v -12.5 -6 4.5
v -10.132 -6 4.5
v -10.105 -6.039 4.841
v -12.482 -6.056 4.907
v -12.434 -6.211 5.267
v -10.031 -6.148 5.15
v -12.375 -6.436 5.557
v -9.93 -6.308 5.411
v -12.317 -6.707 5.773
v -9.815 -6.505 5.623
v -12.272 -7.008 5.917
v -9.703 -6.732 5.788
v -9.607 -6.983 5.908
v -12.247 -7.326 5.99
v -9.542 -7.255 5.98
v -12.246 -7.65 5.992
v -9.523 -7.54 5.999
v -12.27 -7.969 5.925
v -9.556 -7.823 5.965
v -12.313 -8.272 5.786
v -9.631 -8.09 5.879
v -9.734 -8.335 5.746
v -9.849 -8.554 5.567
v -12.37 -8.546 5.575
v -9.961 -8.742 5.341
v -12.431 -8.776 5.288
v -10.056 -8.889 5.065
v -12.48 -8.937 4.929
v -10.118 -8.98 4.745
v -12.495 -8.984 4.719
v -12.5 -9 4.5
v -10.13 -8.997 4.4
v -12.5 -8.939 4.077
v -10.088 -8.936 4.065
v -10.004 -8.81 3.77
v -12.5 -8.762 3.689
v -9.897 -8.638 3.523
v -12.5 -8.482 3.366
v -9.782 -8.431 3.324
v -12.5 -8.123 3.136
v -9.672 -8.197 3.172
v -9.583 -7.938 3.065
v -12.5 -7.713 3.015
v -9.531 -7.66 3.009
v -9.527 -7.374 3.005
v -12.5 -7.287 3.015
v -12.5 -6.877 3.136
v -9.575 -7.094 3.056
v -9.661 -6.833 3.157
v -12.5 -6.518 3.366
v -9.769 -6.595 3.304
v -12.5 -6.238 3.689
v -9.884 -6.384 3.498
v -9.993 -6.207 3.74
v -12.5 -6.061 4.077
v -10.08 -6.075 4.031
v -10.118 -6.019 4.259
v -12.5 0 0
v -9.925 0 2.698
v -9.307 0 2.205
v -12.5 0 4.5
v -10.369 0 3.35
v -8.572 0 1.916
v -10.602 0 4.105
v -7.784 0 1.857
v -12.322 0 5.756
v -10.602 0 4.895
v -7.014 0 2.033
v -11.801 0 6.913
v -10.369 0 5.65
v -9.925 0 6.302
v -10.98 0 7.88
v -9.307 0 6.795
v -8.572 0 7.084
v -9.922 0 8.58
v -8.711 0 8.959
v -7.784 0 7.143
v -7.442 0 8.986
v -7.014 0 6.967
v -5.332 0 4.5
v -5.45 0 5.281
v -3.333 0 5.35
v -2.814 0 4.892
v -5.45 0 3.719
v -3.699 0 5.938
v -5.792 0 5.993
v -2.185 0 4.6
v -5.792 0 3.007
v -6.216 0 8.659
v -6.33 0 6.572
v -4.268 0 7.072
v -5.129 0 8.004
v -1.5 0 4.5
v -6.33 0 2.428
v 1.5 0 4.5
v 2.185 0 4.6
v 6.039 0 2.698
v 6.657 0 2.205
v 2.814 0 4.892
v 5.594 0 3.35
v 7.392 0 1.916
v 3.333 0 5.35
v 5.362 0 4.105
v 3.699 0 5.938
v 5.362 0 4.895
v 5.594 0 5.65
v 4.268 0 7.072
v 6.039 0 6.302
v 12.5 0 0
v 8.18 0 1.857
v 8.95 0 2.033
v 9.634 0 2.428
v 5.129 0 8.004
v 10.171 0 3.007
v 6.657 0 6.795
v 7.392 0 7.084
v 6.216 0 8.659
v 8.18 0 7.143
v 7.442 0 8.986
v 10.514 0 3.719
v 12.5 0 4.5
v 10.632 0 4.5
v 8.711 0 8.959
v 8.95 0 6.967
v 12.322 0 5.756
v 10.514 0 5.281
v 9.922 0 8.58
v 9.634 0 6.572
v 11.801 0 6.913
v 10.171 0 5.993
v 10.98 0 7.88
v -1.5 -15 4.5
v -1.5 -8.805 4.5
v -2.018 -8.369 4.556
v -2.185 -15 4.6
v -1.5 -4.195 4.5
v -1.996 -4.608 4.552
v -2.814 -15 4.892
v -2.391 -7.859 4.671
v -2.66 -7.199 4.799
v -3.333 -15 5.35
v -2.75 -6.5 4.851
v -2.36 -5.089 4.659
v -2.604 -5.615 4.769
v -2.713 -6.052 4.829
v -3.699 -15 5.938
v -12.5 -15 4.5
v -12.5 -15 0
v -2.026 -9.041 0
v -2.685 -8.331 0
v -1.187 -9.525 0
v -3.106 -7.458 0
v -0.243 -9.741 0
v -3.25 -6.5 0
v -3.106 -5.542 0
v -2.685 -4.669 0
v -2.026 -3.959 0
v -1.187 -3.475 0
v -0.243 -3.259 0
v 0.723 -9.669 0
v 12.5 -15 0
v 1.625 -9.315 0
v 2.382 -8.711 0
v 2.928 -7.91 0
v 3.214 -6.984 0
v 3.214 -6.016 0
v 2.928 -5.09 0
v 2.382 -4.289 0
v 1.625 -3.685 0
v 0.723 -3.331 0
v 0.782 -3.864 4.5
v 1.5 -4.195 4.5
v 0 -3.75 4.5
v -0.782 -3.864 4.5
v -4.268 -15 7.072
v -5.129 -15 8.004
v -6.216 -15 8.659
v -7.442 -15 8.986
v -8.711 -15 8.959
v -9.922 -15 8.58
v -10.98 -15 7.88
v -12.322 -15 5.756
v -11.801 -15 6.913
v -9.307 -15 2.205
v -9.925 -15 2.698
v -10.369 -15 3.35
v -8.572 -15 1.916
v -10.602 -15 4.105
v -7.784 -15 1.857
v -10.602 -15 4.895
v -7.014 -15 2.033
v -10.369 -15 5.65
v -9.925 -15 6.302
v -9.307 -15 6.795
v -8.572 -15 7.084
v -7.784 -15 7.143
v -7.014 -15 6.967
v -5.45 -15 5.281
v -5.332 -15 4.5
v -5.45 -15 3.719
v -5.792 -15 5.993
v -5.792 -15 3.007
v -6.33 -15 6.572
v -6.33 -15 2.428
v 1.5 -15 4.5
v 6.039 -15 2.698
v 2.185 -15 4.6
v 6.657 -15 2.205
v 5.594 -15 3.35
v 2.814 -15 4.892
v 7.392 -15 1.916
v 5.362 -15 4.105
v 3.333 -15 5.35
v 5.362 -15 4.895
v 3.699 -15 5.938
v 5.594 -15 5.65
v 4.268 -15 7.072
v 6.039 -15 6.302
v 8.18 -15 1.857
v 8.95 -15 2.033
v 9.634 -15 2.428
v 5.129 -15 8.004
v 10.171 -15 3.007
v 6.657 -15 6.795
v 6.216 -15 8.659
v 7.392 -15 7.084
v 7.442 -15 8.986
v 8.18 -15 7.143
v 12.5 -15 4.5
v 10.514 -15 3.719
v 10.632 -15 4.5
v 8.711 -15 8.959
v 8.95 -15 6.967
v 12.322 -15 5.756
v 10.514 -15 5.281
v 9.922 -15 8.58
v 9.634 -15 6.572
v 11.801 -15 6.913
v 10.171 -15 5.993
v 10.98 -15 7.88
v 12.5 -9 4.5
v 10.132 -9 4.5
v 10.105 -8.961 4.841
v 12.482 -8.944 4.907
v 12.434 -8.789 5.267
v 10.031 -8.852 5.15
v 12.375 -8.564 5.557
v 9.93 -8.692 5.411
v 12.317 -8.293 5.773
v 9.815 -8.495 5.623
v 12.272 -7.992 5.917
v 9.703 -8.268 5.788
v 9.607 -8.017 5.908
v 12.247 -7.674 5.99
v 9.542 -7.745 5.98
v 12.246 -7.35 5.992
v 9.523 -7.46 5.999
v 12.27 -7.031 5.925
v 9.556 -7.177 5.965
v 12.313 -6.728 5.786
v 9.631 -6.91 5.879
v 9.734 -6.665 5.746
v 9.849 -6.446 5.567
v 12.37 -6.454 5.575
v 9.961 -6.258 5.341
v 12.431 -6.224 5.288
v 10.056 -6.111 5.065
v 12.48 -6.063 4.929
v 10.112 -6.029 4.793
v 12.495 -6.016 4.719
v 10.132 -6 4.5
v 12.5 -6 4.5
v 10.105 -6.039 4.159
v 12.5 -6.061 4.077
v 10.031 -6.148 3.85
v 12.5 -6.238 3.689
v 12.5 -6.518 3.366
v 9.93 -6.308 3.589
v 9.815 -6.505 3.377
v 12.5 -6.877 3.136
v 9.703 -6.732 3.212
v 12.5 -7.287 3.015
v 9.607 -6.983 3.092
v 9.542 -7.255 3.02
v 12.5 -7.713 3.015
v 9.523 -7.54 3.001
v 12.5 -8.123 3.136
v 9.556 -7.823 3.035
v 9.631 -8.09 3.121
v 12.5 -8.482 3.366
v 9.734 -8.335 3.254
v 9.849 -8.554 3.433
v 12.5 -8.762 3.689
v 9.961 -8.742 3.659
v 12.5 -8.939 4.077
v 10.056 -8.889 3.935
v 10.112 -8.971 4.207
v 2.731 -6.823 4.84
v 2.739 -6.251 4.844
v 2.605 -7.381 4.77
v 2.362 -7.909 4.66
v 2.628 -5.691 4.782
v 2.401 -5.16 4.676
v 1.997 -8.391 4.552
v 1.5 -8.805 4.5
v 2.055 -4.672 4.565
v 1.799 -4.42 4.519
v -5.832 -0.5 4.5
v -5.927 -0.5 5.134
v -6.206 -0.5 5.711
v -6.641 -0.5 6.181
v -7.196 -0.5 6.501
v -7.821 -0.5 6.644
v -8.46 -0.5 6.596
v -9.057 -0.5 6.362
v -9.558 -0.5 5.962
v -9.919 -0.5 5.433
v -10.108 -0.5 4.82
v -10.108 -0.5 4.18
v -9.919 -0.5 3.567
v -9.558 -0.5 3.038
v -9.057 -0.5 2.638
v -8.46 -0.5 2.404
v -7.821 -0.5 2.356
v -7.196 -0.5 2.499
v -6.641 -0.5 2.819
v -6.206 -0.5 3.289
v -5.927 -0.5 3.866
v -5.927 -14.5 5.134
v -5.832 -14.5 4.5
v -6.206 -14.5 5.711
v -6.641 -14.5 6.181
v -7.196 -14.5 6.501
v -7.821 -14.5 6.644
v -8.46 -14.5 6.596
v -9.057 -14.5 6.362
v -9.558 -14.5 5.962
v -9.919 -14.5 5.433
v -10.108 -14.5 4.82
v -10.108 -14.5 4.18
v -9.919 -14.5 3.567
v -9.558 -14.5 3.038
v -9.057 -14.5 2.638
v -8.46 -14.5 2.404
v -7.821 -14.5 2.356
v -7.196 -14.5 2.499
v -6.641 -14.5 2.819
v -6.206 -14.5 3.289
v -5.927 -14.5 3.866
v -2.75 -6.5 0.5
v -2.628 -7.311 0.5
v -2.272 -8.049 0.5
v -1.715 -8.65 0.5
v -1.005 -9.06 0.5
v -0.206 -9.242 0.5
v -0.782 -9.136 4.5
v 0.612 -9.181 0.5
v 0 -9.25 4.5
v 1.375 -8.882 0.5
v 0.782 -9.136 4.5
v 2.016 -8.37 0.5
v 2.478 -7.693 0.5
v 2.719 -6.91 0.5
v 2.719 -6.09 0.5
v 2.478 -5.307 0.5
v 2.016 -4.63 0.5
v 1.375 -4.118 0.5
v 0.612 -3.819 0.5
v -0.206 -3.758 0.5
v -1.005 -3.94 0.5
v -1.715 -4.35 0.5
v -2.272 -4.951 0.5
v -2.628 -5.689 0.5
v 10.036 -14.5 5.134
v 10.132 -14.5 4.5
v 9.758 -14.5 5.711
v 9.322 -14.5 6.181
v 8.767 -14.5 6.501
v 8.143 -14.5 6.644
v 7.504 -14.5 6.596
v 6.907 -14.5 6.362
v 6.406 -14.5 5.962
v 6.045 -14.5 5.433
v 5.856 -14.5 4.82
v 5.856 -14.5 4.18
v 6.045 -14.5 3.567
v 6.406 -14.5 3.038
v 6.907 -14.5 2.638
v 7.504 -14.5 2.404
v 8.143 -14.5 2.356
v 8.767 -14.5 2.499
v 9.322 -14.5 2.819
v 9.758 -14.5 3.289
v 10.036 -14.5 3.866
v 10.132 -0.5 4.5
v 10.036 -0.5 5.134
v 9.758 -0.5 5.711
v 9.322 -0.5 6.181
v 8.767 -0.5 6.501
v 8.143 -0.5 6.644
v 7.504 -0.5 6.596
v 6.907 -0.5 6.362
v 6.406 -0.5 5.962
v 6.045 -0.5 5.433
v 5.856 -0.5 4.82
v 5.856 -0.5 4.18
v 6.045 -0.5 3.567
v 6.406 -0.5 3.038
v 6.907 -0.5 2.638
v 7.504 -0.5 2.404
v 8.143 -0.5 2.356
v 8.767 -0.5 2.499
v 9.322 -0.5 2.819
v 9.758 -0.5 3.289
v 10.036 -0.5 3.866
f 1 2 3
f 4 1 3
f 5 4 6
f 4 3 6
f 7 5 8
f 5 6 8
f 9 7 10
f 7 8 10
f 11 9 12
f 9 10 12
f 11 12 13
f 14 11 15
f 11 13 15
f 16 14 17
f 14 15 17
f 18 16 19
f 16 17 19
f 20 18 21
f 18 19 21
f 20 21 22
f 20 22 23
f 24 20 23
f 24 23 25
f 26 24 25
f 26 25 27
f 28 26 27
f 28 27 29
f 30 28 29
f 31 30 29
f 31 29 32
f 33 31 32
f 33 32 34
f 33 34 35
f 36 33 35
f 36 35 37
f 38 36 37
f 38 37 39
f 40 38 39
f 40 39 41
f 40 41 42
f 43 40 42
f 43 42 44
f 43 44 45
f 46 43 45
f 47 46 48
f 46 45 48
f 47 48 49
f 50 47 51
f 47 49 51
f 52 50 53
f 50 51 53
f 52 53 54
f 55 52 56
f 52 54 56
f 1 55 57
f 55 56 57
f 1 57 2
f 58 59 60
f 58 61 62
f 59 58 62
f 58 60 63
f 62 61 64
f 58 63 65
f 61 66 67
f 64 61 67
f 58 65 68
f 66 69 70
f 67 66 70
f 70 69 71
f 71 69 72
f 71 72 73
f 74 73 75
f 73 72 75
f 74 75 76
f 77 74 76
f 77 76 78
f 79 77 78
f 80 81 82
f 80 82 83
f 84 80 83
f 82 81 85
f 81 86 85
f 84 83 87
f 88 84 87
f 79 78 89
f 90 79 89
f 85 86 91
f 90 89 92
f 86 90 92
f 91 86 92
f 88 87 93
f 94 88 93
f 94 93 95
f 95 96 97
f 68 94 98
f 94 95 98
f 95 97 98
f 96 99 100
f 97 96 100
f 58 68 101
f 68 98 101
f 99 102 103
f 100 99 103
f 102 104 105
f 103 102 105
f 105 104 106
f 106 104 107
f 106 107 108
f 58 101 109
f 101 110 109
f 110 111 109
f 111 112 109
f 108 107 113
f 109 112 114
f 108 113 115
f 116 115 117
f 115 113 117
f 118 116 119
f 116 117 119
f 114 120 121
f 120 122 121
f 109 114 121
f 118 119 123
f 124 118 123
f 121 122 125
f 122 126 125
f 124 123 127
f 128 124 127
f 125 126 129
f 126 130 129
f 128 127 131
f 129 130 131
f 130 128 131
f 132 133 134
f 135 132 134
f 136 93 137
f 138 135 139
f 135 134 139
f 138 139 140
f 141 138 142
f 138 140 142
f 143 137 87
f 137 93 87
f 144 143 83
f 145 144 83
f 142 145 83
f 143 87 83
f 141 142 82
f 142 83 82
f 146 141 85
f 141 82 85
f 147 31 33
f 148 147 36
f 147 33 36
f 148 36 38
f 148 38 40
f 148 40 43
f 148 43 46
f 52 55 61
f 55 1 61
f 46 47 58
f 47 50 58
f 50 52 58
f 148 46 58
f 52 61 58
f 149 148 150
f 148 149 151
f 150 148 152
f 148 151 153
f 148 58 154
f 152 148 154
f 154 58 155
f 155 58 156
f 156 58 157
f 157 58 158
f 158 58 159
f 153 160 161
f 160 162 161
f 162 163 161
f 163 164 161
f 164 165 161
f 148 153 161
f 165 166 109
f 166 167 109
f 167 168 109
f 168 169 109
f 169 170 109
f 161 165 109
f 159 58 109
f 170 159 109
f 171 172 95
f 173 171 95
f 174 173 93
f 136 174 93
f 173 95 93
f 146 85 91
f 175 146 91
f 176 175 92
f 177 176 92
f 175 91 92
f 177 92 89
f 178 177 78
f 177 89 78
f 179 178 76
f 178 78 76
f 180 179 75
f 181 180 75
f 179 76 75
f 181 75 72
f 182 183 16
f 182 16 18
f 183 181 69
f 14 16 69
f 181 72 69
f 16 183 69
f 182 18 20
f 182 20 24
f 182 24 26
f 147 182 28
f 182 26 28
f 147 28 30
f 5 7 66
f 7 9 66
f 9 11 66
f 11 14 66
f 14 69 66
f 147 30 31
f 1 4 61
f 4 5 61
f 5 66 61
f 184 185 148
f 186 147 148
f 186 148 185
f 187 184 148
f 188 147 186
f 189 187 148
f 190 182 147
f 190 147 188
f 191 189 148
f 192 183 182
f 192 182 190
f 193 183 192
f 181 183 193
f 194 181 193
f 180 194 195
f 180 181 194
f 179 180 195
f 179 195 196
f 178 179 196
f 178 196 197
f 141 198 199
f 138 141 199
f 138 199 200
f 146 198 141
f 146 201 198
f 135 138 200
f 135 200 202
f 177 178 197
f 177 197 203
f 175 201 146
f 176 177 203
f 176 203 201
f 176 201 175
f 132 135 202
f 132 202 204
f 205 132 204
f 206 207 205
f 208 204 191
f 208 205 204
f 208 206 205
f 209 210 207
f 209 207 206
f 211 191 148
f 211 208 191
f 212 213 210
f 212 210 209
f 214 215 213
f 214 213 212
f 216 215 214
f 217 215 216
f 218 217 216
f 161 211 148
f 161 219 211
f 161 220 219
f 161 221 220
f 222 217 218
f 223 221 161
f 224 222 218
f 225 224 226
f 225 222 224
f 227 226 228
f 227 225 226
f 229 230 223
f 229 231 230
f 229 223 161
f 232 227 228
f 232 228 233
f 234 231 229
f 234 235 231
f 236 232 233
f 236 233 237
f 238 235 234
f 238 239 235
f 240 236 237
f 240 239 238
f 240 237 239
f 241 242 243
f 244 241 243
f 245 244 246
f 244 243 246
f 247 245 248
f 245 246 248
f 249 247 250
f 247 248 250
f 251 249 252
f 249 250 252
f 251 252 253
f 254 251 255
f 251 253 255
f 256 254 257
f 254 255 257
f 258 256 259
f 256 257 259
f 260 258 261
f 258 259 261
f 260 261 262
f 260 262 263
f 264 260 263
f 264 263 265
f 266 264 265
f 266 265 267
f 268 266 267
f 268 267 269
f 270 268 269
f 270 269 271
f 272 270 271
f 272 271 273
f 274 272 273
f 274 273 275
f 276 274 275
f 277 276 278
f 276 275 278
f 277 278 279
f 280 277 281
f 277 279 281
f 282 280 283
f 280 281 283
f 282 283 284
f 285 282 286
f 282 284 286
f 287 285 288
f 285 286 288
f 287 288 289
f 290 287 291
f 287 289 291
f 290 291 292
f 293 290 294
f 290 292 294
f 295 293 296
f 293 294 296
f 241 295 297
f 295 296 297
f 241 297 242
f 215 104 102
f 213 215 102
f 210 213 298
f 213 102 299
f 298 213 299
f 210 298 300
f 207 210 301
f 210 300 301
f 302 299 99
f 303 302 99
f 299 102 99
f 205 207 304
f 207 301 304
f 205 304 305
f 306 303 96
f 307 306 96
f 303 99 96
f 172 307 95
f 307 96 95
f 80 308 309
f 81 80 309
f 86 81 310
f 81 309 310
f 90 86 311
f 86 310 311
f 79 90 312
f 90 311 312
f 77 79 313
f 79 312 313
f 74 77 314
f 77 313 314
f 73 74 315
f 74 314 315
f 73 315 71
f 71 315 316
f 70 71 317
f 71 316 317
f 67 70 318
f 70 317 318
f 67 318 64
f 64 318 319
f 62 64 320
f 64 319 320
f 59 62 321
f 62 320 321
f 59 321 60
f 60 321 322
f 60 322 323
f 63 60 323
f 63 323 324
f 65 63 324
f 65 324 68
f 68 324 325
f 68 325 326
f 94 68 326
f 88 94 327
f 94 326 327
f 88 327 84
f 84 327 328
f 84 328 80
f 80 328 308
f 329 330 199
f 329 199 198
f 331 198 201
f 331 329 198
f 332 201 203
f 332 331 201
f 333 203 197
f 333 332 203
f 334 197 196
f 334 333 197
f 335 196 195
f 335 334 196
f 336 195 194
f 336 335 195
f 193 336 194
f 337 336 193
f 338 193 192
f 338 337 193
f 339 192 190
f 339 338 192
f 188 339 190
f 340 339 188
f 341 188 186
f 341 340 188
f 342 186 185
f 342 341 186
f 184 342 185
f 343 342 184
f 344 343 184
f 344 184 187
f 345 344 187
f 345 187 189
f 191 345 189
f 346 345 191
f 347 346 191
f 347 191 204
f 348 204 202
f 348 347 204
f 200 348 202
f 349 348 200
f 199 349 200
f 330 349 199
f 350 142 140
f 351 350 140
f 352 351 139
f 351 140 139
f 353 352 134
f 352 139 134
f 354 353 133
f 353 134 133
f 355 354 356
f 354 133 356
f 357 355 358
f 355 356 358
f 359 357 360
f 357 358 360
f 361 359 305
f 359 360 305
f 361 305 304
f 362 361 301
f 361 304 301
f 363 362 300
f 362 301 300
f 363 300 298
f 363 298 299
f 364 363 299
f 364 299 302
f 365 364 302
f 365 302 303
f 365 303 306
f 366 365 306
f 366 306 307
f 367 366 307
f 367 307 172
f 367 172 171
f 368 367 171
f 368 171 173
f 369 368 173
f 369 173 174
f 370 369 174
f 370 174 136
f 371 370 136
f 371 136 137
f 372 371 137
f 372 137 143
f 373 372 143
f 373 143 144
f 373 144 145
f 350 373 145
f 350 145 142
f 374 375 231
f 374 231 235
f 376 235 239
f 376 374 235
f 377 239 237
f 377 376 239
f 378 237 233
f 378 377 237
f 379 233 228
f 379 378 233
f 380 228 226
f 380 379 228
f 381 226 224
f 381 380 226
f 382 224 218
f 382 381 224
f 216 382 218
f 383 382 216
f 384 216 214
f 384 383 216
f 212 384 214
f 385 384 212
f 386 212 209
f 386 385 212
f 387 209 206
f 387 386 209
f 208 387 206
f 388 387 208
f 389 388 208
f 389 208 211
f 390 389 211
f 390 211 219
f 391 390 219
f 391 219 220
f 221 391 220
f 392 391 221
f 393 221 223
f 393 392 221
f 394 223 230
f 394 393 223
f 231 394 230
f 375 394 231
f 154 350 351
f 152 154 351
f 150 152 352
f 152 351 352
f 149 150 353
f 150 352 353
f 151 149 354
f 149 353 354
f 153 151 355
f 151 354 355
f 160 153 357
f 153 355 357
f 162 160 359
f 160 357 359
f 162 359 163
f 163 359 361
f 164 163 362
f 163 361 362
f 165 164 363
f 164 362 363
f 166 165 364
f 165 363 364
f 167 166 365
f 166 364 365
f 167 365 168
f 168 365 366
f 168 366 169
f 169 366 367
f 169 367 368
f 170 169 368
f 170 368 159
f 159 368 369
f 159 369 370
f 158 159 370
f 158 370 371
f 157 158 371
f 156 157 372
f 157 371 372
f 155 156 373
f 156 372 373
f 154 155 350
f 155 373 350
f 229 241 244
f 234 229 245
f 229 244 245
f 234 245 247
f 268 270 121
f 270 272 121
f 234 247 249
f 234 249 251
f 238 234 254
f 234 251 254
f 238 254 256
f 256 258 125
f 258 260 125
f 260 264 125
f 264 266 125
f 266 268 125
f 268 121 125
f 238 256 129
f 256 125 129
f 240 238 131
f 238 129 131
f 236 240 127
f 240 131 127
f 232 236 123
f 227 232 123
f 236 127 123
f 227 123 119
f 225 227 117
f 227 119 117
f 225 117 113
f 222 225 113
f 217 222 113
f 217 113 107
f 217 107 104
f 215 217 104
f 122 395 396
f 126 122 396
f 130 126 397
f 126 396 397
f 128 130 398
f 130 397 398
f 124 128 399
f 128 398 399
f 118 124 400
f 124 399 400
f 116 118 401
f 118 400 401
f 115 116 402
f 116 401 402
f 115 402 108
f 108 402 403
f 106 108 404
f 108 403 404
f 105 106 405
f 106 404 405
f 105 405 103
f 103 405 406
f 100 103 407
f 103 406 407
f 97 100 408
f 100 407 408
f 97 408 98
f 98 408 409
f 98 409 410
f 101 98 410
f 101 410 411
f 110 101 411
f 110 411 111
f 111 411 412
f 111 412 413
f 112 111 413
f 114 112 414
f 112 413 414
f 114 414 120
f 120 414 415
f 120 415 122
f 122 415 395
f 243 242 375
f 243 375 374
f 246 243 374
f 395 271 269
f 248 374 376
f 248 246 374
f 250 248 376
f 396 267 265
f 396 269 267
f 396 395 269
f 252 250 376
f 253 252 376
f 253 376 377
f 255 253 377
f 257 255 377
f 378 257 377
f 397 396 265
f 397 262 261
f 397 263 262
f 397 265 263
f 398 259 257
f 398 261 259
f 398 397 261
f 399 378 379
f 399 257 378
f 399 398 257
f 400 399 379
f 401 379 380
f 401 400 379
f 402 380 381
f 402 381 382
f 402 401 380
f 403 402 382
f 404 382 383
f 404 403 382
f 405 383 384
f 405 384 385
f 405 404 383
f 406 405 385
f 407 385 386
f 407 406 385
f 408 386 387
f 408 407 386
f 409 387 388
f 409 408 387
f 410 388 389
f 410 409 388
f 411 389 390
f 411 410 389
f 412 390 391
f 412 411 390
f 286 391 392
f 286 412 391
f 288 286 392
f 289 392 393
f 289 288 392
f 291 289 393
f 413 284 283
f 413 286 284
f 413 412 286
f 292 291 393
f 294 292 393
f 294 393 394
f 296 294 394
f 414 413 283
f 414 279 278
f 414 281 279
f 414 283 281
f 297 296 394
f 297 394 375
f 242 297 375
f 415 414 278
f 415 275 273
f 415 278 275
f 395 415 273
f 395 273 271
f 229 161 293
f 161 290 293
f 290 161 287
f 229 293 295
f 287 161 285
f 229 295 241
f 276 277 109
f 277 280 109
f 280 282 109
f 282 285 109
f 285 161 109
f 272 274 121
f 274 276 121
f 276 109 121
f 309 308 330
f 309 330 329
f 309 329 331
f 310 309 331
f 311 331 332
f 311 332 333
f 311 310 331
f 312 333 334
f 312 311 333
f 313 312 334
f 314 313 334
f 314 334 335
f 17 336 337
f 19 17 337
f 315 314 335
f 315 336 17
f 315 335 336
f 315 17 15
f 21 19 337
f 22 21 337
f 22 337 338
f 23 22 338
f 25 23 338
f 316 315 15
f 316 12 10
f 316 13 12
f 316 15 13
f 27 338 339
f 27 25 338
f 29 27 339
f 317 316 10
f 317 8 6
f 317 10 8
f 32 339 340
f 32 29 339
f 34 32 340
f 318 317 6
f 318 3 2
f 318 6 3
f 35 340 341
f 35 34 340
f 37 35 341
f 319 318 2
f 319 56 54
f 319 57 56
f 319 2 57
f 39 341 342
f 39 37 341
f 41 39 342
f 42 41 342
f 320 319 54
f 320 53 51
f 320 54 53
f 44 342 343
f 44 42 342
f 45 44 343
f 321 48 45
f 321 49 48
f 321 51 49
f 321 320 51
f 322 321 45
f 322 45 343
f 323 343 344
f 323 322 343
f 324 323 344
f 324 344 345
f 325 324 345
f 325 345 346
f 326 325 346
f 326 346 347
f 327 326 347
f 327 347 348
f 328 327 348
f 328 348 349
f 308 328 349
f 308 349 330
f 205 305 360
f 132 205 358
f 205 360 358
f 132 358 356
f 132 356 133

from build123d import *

# Parameters (mm, degrees)
F0_R     = 2.15
F1_DEPTH = 15
F3_D     = 5.5
F4_SIZE  = 0.5
F6_D     = 3
F6_DEPTH = 3
F6_TIP   = 0.9012909285
F8_D     = 3
F8_DEPTH = 3
F8_TIP   = 0.9012909285


with BuildPart() as f1:
    # F0 (on Front) → F1 (new body)
    with BuildSketch(Plane.XZ):
        with BuildLine():
            Line((-12.5, 4.5), (-12.5, 0))
            Line((-12.5, 0), (0, 0))
            Line((0, 0), (12.5, 0))
            Line((12.5, 0), (12.5, 4.5))
            ThreePointArc((12.5, 4.5), (8.7106121428, 8.9589284982), (3.6988942602, 5.9383014856))
            ThreePointArc((3.6988942602, 5.9383014856), (2.8137586471, 4.8915084722), (1.5, 4.5))
            Line((1.5, 4.5), (0, 4.5))
            Line((0, 4.5), (-1.5, 4.5))
            ThreePointArc((-1.5, 4.5), (-2.8137586471, 4.8915084722), (-3.6988942602, 5.9383014856))
            ThreePointArc((-3.6988942602, 5.9383014856), (-8.7106121428, 8.9589284982), (-12.5, 4.5))
        make_face()
        with Locations((-7.9819214904, 4.5)):
            Circle(F0_R, mode=Mode.SUBTRACT)
        with Locations((7.9819214904, 4.5)):
            Circle(F0_R, mode=Mode.SUBTRACT)
    extrude(amount=F1_DEPTH)

    # F3 (through all)
    with Locations(Plane(origin=(0, 0, 0), x_dir=(1, 0, 0), z_dir=(0, 0, -1))):
        with Locations((0, 6.5)):
            Hole(F3_D / 2)

    # F4
    f4_edges = [f1.edges().sort_by_distance(p)[0] for p in [
        (-10.131921, 0, 4.5),
        (5.831921, 0, 4.5),
        (-10.131921, -15, 4.5),
        (5.831921, -15, 4.5),
        (-2.75, -6.5, 0),
    ]]
    chamfer(f4_edges, length=F4_SIZE)

    # F6
    with Locations(Plane(origin=(-12.5, 0, 0), x_dir=(0, -1, 0), z_dir=(-1, 0, 0))):
        with Locations((7.5, 4.5)):
            Hole(F6_D / 2, depth=F6_DEPTH)
            with Locations((0, 0, -(F6_DEPTH + F6_TIP / 2))):  # 118° drill point
                Cone(0, F6_D / 2, F6_TIP, mode=Mode.SUBTRACT)

    # F8
    with Locations(Plane.YZ.offset(12.5)):
        with Locations((-7.5, 4.5)):
            Hole(F8_D / 2, depth=F8_DEPTH)
            with Locations((0, 0, -(F8_DEPTH + F8_TIP / 2))):  # 118° drill point
                Cone(0, F8_D / 2, F8_TIP, mode=Mode.SUBTRACT)


solid = f1.part
